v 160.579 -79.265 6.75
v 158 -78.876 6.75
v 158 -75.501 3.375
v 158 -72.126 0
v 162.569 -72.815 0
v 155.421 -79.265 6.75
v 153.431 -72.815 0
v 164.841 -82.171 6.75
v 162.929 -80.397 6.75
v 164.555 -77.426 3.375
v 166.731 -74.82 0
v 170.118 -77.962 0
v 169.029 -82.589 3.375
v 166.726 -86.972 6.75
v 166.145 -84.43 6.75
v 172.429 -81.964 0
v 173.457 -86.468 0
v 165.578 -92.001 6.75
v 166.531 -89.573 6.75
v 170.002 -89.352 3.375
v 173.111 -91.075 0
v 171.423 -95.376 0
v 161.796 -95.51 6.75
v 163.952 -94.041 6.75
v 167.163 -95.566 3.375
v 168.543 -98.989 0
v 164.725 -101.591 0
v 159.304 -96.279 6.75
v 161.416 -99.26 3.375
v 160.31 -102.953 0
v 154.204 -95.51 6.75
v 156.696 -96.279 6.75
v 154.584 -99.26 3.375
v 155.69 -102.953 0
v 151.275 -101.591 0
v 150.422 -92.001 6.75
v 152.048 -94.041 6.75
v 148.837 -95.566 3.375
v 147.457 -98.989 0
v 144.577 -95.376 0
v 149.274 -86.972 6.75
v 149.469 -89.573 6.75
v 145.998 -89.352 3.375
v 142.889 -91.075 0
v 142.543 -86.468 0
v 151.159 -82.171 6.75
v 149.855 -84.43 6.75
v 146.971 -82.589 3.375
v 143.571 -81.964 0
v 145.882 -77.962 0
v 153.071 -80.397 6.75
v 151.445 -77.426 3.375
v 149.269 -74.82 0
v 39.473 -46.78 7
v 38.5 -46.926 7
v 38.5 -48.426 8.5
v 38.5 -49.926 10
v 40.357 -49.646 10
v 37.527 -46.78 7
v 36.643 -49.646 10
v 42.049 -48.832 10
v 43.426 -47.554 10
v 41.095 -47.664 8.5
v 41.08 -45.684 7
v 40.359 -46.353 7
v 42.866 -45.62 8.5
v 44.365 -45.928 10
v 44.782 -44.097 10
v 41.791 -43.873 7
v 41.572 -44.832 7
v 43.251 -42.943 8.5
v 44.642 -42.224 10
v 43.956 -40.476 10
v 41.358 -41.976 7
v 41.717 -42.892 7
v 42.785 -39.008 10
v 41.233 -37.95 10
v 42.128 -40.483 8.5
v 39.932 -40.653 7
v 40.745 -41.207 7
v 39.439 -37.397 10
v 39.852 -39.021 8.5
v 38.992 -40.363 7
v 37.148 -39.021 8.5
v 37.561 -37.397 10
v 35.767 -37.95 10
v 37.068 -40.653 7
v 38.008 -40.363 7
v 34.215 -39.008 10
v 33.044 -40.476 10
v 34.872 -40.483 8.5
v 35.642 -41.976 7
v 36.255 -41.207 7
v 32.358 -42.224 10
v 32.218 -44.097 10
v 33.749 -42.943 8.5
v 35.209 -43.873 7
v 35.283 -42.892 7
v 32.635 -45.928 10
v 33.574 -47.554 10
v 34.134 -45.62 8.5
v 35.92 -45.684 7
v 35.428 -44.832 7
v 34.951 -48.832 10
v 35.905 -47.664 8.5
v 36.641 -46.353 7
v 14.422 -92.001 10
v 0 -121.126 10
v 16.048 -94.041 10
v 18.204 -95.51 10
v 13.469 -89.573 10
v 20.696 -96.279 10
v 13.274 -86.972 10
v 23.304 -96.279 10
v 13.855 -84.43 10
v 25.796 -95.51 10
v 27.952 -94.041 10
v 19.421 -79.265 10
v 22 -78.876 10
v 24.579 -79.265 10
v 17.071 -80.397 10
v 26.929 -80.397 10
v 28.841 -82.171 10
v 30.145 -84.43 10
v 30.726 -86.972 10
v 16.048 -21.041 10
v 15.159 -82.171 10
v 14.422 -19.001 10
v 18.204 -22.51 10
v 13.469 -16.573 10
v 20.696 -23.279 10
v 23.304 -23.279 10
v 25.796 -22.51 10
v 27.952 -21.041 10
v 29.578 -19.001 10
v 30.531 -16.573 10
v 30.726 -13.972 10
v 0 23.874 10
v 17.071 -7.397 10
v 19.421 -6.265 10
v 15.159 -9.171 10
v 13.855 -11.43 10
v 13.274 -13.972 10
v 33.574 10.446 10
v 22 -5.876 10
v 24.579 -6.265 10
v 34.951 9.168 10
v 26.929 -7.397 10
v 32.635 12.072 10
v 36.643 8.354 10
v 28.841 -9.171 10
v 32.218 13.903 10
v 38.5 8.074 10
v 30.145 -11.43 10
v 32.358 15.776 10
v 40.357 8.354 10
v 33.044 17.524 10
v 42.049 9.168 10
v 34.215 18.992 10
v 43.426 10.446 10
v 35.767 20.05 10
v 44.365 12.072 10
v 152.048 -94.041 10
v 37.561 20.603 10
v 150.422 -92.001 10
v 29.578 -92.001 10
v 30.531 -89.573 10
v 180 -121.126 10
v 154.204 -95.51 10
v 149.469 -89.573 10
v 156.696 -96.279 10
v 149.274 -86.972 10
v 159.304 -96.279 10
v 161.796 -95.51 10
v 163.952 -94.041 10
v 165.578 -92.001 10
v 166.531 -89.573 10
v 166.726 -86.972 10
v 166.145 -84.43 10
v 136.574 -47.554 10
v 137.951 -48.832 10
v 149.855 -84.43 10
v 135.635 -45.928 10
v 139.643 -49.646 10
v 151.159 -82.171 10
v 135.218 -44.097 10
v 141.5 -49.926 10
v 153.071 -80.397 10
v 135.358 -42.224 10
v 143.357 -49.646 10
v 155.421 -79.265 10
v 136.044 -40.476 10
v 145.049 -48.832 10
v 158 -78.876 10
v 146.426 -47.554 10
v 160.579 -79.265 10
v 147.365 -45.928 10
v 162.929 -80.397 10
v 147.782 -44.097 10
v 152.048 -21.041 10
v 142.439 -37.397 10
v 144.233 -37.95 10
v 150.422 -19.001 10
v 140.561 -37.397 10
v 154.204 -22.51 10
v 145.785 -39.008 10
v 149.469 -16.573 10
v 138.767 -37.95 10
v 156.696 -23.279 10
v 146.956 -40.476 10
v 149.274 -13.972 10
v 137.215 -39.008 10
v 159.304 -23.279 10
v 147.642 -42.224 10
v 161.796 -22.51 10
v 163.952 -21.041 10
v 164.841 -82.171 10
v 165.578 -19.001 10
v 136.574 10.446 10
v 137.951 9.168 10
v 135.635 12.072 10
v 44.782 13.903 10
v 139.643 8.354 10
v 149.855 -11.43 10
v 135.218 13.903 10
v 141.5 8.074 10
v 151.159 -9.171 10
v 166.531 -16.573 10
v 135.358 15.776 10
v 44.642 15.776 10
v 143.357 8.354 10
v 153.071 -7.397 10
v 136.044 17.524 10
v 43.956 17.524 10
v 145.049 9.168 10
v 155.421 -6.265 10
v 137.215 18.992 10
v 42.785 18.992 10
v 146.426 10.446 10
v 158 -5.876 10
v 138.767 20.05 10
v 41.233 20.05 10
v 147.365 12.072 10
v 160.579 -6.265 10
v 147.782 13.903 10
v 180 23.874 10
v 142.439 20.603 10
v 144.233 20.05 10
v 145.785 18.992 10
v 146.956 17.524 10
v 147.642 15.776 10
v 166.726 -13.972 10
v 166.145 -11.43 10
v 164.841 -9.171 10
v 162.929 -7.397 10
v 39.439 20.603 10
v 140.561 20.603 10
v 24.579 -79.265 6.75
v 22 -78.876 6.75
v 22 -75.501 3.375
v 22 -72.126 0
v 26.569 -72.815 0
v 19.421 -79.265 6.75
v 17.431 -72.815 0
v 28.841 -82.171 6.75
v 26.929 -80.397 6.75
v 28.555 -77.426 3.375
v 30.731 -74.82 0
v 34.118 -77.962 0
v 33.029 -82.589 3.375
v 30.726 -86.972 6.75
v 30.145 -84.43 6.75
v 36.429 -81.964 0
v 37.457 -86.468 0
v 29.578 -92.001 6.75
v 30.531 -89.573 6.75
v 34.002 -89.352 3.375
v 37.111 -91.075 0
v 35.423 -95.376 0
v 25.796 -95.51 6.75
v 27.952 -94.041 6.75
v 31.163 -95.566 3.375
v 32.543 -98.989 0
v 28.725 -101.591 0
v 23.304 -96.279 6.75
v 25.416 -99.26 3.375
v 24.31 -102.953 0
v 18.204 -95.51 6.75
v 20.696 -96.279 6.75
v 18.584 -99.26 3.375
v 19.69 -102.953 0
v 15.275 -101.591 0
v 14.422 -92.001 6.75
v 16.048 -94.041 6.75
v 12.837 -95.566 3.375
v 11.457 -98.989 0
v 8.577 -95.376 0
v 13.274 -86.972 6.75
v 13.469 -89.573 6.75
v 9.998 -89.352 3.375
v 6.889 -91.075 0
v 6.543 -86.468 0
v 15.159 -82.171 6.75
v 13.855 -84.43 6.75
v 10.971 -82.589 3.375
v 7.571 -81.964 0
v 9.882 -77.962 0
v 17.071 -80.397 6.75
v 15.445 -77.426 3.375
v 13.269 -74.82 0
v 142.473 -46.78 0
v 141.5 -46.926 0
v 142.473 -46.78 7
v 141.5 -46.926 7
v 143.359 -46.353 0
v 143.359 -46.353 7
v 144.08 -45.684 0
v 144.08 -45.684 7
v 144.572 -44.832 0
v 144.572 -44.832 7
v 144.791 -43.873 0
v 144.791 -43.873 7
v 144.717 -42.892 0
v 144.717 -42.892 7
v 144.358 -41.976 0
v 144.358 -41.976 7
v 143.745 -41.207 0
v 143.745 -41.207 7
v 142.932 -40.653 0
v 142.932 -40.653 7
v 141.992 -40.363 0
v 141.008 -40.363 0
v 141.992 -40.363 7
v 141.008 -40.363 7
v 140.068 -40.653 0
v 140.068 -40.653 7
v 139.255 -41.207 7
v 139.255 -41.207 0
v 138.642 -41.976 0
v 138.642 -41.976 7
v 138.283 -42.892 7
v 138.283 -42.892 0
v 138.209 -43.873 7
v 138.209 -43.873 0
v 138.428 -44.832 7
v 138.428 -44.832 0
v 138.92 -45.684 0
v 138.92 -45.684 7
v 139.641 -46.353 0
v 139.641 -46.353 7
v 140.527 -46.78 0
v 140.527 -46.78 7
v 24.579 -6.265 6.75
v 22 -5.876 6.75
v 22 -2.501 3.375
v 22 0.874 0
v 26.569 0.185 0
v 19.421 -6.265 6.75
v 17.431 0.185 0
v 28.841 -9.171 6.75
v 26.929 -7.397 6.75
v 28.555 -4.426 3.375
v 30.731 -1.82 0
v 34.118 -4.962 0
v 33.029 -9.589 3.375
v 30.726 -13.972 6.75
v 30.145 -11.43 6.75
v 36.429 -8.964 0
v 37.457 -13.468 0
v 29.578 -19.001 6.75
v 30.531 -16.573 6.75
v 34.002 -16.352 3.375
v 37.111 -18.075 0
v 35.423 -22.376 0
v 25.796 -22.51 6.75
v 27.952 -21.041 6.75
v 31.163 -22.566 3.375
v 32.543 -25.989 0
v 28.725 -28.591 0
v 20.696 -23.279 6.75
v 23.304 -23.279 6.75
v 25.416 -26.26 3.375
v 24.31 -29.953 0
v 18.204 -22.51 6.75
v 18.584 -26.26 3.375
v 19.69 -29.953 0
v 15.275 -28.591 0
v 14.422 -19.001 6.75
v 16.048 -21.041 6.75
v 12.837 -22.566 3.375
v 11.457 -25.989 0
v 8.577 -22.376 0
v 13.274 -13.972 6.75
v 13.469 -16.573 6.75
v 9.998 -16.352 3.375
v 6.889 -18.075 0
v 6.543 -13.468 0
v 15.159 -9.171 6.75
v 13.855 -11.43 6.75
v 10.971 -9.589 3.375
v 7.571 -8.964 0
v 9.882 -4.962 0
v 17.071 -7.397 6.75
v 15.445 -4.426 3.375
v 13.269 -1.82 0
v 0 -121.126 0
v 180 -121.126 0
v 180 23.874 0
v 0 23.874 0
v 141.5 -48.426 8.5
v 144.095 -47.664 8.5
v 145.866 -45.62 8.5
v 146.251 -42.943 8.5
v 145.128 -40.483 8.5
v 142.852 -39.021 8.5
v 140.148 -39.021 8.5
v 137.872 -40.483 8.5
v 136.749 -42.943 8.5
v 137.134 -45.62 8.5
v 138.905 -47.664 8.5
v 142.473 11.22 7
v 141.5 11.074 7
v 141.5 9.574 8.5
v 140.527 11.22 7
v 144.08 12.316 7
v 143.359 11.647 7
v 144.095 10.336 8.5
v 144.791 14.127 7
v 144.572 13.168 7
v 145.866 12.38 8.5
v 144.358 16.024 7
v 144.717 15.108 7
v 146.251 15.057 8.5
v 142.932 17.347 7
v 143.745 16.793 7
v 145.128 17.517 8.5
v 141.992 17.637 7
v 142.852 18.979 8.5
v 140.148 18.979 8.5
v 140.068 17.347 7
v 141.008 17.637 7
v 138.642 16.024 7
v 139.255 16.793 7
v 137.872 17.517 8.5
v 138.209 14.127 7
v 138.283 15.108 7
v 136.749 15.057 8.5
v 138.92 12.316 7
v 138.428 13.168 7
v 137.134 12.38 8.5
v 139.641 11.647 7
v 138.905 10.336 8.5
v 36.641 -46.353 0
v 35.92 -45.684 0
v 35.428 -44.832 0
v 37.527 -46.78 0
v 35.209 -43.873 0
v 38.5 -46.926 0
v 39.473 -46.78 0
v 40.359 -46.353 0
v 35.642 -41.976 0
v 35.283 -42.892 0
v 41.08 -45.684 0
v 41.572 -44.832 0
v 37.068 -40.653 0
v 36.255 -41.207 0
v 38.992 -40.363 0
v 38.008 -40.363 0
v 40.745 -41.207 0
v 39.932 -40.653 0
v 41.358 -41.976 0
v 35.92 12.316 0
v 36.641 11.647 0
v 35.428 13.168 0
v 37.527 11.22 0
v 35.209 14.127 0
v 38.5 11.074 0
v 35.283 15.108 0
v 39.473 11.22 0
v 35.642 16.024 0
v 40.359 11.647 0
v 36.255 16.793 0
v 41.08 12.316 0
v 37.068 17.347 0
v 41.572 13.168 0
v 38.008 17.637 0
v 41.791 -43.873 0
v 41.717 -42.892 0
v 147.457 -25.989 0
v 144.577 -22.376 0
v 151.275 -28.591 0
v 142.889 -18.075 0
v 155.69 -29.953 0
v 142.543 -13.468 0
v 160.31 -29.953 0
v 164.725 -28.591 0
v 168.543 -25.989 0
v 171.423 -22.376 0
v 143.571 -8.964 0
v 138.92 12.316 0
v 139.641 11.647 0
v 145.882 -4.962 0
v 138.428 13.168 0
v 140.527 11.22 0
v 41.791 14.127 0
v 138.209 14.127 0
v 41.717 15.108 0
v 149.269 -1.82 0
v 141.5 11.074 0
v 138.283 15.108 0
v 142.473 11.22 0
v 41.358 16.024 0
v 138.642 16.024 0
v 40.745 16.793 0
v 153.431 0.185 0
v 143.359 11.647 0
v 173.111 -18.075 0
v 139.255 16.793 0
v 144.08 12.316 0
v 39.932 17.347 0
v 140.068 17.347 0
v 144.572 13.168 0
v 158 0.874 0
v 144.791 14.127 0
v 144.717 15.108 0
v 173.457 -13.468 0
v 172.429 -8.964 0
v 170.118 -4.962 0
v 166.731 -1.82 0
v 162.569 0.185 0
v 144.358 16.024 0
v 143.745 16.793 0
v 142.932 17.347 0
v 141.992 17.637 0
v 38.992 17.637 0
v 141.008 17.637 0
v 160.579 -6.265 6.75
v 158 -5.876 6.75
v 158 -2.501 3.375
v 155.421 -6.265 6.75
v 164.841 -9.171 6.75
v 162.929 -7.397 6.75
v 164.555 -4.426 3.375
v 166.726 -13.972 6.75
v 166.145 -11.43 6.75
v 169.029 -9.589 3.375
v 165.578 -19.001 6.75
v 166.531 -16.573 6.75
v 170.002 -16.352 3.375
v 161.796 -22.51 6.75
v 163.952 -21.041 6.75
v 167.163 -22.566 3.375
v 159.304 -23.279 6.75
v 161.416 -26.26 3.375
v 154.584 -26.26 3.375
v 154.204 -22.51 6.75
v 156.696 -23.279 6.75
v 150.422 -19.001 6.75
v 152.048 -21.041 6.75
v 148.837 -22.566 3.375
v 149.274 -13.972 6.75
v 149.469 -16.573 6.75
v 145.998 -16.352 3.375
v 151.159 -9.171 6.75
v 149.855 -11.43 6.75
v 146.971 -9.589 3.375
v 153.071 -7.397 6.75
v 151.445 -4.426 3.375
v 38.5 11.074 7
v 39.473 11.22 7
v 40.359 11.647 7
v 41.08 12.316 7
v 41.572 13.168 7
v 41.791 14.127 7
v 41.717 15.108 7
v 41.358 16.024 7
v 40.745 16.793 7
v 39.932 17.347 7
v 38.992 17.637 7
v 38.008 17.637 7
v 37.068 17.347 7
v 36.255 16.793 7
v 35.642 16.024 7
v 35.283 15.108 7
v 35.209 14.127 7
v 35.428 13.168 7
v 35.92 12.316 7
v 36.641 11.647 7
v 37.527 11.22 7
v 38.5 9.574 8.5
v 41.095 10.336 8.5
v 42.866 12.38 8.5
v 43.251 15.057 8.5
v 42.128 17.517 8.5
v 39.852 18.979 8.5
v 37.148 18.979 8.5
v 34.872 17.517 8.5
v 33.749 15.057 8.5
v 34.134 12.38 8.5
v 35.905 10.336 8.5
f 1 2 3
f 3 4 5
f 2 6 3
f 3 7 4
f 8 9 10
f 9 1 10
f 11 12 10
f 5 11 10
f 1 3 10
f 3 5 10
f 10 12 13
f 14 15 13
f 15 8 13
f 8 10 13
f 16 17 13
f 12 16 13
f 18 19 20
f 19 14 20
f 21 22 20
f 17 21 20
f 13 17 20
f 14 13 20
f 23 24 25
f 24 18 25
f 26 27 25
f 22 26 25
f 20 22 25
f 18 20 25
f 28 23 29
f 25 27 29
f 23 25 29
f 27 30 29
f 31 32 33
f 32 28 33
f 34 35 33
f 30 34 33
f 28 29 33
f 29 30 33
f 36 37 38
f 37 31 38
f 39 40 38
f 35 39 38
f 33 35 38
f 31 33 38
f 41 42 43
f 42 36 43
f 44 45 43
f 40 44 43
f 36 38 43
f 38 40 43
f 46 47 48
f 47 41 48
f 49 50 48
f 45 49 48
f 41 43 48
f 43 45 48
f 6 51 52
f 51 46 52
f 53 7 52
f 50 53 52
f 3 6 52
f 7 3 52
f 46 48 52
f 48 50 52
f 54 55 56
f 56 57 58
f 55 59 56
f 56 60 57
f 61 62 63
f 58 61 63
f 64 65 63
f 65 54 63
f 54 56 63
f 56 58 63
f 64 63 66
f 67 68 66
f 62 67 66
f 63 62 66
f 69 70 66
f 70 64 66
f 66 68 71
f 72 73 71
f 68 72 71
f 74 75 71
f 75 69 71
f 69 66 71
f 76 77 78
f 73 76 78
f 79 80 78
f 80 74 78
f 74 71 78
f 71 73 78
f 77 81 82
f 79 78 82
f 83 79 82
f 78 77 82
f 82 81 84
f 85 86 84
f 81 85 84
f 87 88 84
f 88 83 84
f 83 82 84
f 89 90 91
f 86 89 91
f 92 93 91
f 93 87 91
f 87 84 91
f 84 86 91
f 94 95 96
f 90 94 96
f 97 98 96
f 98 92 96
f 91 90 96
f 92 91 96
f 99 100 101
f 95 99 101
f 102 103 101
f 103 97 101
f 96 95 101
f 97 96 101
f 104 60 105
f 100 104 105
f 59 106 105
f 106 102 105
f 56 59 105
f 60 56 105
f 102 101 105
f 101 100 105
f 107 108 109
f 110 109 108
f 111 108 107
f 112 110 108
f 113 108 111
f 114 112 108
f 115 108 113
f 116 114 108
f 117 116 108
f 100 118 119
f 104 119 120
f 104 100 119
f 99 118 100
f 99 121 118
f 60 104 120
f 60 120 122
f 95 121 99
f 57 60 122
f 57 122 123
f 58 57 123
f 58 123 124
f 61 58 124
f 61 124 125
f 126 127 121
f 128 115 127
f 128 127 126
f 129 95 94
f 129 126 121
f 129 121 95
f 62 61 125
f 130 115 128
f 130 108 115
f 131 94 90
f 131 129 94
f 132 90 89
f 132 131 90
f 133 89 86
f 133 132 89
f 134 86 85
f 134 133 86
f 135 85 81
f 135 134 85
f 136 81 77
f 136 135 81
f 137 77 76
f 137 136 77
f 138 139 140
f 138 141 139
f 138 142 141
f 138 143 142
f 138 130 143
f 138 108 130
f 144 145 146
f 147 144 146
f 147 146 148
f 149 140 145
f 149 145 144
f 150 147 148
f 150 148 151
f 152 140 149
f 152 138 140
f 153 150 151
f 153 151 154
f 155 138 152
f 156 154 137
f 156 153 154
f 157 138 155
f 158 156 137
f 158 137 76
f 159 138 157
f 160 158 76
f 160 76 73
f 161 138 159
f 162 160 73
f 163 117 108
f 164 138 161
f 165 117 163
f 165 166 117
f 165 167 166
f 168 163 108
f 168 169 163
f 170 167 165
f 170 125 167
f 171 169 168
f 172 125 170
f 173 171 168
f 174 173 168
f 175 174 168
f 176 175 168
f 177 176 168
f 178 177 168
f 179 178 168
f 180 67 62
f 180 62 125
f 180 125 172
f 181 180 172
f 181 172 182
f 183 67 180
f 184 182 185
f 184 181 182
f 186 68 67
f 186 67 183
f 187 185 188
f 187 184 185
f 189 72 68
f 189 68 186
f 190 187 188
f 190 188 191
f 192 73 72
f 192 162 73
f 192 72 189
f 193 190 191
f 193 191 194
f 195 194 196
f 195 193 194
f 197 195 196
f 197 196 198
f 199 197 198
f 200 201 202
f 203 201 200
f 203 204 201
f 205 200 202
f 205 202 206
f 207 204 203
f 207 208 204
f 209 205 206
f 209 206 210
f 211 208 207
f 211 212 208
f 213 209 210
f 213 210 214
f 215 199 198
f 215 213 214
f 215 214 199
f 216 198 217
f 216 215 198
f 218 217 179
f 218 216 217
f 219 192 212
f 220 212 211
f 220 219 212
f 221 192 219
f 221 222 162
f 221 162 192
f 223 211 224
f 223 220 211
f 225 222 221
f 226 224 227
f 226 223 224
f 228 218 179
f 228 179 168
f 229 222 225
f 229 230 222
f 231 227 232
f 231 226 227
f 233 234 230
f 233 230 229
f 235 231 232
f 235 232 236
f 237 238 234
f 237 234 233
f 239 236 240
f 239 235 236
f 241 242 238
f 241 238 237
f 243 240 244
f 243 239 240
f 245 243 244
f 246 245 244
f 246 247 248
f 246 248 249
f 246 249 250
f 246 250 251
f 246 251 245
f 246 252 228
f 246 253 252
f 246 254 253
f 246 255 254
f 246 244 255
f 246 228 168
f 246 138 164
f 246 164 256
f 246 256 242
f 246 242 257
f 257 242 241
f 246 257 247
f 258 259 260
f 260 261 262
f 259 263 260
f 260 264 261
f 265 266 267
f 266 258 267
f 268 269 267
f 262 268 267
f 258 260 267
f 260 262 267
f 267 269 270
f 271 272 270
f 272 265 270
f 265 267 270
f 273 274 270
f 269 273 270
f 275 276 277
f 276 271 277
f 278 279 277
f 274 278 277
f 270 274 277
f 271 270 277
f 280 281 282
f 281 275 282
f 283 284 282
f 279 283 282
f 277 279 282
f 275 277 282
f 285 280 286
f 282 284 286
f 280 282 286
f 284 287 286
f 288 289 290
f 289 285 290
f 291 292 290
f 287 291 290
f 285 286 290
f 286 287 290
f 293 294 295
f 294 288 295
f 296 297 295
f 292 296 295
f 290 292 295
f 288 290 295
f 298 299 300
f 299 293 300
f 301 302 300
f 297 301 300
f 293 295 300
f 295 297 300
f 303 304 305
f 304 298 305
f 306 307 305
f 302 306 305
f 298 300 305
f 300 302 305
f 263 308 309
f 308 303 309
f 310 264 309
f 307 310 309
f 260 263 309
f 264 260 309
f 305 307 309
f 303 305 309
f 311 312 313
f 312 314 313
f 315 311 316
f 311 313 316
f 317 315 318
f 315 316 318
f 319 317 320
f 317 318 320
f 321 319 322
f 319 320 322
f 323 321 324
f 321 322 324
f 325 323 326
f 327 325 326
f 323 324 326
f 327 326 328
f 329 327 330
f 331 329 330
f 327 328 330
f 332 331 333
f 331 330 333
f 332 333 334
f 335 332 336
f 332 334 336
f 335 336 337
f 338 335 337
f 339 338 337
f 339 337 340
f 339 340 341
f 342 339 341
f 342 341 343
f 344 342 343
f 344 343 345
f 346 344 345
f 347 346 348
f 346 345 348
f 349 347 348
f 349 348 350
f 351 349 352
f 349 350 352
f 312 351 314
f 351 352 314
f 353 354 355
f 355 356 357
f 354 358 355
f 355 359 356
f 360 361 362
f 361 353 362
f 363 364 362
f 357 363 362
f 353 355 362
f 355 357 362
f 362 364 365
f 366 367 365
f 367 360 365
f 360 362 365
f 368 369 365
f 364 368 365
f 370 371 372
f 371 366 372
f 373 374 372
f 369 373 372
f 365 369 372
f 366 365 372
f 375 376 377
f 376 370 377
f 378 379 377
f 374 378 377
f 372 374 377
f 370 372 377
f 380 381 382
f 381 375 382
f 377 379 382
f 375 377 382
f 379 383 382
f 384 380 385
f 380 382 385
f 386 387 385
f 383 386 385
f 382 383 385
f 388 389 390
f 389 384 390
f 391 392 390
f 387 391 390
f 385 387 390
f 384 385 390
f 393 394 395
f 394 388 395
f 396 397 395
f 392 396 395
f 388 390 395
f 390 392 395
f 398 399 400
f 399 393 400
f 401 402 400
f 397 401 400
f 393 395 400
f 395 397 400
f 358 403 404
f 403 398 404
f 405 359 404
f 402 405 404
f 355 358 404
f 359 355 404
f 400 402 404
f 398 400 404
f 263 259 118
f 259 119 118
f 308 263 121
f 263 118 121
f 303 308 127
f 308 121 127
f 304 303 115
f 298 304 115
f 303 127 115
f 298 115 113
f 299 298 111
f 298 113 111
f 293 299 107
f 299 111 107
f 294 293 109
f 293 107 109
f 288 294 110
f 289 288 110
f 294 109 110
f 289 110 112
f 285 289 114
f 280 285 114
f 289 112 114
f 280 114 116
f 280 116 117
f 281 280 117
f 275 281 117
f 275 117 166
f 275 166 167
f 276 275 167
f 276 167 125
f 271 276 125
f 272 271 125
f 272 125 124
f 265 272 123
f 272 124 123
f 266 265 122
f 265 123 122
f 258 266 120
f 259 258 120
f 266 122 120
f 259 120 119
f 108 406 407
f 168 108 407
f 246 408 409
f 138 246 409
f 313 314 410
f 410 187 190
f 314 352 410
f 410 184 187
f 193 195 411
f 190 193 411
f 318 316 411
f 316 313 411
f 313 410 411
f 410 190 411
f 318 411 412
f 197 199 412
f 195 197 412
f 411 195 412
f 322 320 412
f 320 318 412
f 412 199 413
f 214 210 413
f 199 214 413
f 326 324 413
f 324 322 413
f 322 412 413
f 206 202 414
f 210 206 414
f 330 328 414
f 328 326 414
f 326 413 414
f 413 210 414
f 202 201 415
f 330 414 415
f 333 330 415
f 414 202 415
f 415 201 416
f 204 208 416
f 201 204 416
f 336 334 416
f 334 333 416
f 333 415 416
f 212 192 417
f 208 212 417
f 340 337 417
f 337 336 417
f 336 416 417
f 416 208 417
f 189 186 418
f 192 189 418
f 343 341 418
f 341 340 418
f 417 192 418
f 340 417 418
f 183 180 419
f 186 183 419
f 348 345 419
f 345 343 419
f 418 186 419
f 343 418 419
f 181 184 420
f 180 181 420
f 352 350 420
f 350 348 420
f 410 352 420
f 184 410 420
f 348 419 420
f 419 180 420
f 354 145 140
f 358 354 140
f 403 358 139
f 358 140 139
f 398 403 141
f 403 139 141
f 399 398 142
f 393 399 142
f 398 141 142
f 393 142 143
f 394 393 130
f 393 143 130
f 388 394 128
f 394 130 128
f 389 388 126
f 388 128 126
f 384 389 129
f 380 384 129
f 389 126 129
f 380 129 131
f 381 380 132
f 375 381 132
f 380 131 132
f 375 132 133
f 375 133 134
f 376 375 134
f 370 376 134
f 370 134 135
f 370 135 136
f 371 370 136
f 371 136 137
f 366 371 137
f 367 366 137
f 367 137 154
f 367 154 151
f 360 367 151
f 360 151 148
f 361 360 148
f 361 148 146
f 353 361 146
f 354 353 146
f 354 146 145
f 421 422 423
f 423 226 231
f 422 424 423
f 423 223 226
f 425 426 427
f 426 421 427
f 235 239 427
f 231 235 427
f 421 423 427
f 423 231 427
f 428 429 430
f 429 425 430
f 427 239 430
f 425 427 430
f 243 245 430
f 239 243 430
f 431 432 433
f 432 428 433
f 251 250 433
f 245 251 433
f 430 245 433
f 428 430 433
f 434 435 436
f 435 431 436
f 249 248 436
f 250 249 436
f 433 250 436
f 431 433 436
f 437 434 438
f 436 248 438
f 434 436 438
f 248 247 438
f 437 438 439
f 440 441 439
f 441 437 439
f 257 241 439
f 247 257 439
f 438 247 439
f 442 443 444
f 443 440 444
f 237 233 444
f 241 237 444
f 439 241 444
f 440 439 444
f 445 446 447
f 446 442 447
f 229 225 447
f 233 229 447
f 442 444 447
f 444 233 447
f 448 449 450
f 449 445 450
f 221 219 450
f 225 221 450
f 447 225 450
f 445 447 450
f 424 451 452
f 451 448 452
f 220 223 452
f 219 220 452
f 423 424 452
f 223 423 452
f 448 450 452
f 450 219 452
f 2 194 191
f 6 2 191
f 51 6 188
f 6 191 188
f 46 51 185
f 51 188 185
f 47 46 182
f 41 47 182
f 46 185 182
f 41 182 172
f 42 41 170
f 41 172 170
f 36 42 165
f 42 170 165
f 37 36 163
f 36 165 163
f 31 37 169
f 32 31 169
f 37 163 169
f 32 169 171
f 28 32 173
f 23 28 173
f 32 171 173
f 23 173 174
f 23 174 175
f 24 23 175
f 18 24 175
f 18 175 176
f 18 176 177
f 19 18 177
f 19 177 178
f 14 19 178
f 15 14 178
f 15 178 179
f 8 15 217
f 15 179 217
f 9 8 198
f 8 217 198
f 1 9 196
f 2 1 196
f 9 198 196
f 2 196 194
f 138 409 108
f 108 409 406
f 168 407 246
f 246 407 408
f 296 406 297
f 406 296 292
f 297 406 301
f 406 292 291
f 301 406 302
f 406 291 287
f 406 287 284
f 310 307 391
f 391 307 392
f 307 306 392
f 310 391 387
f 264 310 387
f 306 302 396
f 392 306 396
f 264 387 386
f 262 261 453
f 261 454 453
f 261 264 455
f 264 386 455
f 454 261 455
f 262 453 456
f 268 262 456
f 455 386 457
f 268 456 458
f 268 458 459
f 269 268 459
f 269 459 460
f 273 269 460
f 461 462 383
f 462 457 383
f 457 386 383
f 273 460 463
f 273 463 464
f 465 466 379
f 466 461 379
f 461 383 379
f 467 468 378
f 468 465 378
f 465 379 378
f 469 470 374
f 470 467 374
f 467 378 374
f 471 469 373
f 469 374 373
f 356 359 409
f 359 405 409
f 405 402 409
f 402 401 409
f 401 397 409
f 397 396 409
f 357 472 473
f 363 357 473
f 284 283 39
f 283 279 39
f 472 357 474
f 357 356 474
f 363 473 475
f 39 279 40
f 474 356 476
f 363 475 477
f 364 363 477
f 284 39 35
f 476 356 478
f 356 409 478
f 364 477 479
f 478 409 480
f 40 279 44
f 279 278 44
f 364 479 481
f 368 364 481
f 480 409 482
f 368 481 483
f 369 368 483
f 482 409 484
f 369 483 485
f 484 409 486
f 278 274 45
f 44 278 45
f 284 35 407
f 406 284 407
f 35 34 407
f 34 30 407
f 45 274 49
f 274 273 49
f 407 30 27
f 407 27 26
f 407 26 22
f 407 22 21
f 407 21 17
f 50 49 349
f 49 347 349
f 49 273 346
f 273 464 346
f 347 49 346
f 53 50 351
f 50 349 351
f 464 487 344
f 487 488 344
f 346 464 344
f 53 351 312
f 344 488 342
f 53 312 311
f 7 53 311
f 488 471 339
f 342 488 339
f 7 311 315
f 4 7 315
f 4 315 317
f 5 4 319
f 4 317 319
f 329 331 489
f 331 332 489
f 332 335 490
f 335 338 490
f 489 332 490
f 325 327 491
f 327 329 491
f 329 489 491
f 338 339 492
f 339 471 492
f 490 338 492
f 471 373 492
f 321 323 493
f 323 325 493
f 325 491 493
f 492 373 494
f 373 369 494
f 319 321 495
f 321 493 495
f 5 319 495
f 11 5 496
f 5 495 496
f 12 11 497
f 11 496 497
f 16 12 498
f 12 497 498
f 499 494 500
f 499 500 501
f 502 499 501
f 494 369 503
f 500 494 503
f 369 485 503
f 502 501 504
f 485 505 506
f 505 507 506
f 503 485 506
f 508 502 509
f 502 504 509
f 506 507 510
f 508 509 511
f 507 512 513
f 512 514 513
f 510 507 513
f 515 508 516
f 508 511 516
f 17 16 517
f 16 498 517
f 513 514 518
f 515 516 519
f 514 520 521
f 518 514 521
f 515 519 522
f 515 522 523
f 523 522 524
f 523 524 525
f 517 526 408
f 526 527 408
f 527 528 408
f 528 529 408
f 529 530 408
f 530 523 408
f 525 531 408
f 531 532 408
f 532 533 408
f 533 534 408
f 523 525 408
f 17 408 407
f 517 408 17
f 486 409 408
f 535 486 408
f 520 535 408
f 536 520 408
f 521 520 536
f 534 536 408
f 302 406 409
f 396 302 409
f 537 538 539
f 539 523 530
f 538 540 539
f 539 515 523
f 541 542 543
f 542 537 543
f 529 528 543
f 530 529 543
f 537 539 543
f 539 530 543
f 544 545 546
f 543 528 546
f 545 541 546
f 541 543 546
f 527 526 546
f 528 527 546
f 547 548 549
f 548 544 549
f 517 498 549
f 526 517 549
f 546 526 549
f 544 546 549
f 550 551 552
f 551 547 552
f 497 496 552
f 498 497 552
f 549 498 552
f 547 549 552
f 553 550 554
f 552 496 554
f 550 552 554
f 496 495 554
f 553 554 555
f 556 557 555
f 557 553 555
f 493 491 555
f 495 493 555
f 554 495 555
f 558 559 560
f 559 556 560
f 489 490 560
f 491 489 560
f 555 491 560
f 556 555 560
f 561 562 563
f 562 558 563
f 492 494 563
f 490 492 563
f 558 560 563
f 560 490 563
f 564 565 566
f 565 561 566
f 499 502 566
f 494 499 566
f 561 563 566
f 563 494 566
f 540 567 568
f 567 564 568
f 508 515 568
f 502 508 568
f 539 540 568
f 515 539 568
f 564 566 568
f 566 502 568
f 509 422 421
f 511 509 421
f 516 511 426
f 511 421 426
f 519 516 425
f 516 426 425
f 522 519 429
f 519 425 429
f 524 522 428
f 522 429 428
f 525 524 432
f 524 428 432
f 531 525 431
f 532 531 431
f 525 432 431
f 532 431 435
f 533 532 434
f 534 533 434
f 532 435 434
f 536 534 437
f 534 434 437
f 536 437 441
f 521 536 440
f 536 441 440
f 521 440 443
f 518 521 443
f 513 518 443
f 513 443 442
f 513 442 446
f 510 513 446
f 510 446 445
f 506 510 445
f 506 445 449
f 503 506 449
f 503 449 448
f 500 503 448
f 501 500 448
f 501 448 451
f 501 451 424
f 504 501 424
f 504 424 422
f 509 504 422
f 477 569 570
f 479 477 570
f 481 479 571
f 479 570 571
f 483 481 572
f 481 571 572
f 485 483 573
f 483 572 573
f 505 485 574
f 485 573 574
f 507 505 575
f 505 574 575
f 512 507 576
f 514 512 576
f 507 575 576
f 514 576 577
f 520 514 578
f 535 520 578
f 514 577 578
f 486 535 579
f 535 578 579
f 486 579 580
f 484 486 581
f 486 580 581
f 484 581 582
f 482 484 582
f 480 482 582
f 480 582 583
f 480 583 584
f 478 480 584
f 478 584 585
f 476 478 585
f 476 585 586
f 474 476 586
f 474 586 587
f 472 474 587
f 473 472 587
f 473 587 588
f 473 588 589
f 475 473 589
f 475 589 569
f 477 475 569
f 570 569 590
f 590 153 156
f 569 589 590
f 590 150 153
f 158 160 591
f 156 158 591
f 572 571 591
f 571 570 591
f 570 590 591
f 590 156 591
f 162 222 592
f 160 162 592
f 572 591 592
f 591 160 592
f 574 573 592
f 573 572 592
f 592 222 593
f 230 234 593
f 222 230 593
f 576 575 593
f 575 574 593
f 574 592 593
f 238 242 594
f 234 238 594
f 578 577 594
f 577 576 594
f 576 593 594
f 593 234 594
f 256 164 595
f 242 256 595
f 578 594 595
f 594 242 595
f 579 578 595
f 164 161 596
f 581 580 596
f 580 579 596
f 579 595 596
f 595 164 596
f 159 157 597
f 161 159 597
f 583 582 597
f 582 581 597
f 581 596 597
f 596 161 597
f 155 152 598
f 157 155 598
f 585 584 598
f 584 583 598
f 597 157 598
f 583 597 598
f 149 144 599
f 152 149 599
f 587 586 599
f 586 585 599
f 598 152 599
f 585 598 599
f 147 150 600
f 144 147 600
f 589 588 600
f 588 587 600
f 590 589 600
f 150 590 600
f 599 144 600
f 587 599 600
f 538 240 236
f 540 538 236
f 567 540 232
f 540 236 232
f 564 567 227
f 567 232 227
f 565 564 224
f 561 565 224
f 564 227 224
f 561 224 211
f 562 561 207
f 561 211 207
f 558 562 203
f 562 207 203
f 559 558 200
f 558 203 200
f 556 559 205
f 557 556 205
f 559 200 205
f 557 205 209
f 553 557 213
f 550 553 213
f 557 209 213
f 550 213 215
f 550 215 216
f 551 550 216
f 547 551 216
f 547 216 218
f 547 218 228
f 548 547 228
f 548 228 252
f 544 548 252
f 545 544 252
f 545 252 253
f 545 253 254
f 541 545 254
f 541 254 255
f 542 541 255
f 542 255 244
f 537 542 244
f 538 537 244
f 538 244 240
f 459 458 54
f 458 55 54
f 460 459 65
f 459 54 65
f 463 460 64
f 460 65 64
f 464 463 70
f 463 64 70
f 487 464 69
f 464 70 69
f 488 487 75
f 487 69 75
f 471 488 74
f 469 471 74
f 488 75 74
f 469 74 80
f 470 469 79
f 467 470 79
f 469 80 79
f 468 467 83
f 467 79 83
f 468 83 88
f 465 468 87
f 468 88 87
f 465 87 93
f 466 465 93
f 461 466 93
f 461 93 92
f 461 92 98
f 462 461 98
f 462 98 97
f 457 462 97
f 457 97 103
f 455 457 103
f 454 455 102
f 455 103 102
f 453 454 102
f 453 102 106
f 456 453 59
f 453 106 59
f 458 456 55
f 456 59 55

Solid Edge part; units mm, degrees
sketch "Sketch1" plane through (0, 0, 0) normal (0, 0, 1) x (1, 0, 0)
  line L0 (0, -121.1263) -> (180, -121.1263)
  line L1 (180, -121.1263) -> (180, 23.8737)
  line L2 (180, 23.8737) -> (0, 23.8737)
  line L3 (0, 23.8737) -> (0, -121.1263)
  dimension "D1" = 180
  dimension "D2" = 145
extrude "Protrusion1" add sketch "Sketch1" along normal blind 10
hole "Hole_3" at (141.5, 14.3737, 10) direction (0, 0, -1) diameter 6.6 end through all countersink diameter 12.6 countersink angle 90
hole "Hole1" at (141.5, -43.6263, 10) direction (0, 0, -1) diameter 6.6 end through all countersink diameter 12.6 countersink angle 90
hole "Hole2" at (38.5, -43.6263, 10) direction (0, 0, -1) diameter 6.6 end through all countersink diameter 12.6 countersink angle 90
hole "Hole3" at (38.5, 14.3737, 10) direction (0, 0, -1) diameter 6.6 end through all countersink diameter 12.6 countersink angle 90
hole "Hole_7" at (22, -14.6263, 0) direction (0, 0, 1) diameter 17.5 depth 50.8 countersink diameter 31 countersink angle 90
hole "Hole4" at (22, -87.6263, 0) direction (0, 0, 1) diameter 17.5 depth 50.8 countersink diameter 31 countersink angle 90
hole "Hole5" at (158, -87.6263, 0) direction (0, 0, 1) diameter 17.5 depth 50.8 countersink diameter 31 countersink angle 90
hole "Hole6" at (158, -14.6263, 0) direction (0, 0, 1) diameter 17.5 depth 50.8 countersink diameter 31 countersink angle 90
properties material "Aluminum, 6061-T6"
